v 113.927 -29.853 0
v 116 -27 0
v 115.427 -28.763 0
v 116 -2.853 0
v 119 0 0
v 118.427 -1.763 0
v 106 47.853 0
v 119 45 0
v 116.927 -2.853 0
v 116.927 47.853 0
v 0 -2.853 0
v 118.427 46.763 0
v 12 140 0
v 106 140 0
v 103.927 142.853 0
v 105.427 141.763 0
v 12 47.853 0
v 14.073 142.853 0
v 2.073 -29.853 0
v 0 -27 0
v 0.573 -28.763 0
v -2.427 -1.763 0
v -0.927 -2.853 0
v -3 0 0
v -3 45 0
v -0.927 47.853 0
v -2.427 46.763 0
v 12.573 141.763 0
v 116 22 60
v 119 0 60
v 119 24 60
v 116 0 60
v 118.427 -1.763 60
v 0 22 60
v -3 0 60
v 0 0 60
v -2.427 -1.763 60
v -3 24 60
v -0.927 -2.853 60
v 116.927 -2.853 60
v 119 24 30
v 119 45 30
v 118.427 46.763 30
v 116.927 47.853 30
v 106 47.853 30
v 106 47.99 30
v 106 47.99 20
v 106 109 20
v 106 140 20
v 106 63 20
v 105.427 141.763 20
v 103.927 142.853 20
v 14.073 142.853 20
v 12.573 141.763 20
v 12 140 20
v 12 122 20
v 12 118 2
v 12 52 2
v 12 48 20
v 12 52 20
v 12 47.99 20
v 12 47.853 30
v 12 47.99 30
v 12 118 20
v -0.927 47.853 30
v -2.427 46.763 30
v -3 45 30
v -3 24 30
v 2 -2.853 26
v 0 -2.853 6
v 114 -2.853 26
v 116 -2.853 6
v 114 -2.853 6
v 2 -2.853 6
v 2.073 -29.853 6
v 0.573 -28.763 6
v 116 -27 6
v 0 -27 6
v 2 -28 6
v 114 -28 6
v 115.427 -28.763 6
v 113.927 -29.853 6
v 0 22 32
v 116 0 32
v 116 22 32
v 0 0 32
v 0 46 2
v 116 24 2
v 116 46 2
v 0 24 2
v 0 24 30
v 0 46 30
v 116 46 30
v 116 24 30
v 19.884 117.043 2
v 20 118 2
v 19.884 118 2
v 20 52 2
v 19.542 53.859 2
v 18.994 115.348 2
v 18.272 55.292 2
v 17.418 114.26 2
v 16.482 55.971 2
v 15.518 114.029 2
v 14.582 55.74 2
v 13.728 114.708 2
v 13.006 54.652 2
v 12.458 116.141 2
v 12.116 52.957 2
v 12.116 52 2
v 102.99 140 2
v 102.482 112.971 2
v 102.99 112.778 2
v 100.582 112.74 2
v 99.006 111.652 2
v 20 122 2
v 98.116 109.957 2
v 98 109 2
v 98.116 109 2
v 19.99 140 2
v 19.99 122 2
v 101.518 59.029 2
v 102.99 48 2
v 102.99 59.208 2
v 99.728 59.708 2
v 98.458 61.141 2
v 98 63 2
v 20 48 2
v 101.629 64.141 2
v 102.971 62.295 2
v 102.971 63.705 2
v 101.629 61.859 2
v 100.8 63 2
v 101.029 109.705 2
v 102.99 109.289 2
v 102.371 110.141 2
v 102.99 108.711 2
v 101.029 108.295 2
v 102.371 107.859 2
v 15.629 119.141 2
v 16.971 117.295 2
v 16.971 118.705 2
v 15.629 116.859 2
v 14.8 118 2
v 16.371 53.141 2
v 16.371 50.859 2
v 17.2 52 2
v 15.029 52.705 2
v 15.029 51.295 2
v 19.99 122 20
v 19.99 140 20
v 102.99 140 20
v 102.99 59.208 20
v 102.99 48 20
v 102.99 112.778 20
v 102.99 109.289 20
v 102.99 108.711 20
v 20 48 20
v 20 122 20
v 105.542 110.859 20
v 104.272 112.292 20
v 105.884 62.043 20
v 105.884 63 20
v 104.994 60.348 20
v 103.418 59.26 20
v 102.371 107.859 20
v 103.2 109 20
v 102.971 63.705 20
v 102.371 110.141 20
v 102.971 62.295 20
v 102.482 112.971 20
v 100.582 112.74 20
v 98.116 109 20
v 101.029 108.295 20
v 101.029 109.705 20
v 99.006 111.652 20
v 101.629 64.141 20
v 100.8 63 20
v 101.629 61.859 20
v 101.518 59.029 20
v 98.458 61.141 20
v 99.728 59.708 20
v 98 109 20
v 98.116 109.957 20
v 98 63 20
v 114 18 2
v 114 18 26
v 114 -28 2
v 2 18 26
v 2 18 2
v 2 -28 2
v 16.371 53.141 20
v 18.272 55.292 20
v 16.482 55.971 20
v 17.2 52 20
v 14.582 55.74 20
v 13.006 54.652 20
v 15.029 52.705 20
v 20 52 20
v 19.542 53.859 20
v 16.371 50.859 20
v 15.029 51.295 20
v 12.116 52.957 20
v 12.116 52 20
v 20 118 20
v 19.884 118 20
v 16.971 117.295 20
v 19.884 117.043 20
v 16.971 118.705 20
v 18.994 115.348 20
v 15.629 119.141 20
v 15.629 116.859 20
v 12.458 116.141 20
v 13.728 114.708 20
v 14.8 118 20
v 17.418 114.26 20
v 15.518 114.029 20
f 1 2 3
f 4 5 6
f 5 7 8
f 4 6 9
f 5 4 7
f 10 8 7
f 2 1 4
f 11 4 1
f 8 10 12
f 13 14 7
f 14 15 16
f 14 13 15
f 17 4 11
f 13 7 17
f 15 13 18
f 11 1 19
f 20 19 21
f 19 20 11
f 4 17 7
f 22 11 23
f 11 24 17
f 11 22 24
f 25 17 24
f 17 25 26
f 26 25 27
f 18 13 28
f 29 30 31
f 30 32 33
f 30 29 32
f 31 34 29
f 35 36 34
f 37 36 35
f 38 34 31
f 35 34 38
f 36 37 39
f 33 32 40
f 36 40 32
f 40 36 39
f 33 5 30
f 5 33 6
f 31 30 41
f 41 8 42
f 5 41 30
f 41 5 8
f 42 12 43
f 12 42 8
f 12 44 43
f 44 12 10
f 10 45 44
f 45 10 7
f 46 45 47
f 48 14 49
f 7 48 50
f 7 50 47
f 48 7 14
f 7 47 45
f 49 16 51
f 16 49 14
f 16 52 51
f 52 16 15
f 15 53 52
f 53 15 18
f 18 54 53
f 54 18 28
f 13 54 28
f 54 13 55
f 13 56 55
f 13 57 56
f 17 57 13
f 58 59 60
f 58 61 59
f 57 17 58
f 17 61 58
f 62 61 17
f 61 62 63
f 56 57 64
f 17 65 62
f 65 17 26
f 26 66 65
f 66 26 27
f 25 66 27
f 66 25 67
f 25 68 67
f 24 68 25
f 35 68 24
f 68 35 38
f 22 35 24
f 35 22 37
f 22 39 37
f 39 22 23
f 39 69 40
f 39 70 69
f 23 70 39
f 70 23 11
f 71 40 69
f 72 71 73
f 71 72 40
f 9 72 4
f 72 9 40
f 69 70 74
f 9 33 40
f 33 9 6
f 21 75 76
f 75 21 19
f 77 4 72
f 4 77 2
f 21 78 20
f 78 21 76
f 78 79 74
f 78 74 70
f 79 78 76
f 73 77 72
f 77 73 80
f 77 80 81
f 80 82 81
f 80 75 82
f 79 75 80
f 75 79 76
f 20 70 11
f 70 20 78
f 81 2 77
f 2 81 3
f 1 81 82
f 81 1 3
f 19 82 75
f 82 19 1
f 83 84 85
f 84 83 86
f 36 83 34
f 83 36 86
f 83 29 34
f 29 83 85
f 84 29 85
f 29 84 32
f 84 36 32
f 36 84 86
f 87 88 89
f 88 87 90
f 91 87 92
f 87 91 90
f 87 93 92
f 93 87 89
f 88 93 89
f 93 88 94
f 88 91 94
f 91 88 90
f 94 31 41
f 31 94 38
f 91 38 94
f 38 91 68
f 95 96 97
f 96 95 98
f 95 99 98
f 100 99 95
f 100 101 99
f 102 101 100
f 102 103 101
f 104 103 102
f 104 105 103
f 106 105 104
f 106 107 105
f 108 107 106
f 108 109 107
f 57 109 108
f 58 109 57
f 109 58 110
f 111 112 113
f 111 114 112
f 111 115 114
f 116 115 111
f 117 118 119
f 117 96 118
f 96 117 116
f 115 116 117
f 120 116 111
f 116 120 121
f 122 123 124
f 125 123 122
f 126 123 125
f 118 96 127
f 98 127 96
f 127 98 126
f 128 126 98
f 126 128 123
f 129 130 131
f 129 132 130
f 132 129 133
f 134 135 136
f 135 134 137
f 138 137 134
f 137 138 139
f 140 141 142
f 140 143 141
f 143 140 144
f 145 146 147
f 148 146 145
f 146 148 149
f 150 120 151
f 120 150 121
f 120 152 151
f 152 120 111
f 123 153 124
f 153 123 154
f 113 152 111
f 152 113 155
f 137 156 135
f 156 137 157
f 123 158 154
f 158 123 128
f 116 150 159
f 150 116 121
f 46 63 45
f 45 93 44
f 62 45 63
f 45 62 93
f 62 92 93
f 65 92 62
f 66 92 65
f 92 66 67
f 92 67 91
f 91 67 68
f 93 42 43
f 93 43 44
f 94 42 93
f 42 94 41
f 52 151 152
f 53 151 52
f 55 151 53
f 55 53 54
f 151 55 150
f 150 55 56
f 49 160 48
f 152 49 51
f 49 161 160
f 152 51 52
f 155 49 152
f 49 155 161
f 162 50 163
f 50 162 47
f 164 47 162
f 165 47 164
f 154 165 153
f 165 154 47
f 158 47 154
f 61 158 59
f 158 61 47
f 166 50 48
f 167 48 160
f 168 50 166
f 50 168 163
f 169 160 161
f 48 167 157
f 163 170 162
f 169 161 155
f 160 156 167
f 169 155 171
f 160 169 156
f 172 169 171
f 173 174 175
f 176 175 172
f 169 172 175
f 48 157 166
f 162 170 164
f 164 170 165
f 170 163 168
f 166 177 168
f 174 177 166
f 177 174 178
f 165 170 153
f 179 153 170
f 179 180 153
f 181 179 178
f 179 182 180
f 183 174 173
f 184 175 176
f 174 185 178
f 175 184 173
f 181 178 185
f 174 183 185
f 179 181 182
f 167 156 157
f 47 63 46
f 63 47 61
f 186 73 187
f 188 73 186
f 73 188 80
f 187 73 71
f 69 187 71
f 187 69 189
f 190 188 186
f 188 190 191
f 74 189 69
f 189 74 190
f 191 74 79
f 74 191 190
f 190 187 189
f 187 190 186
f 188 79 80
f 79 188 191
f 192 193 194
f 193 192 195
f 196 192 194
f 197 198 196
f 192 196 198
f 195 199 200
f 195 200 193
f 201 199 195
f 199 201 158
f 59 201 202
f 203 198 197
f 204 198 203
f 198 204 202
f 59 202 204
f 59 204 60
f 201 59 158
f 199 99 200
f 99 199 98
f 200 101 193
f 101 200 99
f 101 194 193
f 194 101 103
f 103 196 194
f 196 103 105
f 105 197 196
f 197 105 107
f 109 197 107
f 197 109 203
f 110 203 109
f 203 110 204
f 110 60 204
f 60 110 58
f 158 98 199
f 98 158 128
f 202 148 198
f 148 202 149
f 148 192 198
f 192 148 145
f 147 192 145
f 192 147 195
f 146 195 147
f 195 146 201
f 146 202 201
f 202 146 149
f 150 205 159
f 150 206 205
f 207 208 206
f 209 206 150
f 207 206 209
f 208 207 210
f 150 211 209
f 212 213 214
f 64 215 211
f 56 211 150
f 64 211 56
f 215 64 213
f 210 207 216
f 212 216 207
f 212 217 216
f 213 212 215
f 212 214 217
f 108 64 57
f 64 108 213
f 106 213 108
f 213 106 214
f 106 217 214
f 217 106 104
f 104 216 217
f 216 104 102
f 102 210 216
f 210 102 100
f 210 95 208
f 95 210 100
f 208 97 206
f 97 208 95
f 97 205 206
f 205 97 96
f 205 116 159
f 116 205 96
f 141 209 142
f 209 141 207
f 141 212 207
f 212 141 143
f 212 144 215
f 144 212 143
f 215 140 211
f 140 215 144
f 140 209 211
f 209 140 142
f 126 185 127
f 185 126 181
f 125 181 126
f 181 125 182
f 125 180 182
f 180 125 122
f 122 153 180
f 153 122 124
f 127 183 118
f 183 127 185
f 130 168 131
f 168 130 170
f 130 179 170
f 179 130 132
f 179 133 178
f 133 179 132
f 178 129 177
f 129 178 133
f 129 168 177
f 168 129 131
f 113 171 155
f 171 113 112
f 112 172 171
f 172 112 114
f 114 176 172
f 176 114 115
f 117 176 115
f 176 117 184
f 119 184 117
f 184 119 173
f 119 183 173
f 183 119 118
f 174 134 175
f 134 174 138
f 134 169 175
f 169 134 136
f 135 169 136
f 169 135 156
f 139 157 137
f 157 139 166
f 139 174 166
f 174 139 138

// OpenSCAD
// file: ../rpi.scad
 // include <./RPi4board-modded.scad>;



// translate([5, 61, 5])
  // rotate([0, 0, 270])
   // board_raspberrypi_4_model_b();


// rpi4([2, 2, 2], [0, 0, 2]);


slop=0.01;
module rpi4(
  rpi_buffer, 
  rpi_padding,
  expose_card=false,
  expose_hdmi=false,
  expose_usb1=false,
  expose_usb2=false,
  expose_ribbon_cable=false,
  expose_gpio_pins=false,
  head_room=4
  )
{
  rpi_screws=[58, 49, 3];
  rpi_size=[88, 58, 13];

  difference() {
    gen_rpi(rpi_screws, rpi_size, rpi_buffer, rpi_padding, expose_card, expose_hdmi, expose_usb1,   expose_usb2, expose_ribbon_cable, expose_gpio_pins, head_room);
  
    // usb 1
    translate([92, 6, 5])
      cube([16, 16, 18]);

    // usb 2
    translate([92, 24, 5])
      cube([16, 16, 18]);

    // ethernet
    translate([92, 42, 5])
      cube([16, 18, 16]);

    // power
    translate([9, -slop, rpi_padding.z + rpi_buffer.z])
      cube([14, rpi_buffer.x + 2*slop, 7]);

    // hdmi
    translate([26.5, -slop, rpi_padding.z + rpi_buffer.z])
      cube([9, rpi_buffer.x + 2*slop, 5]);

    // hdm2
    translate([40, -slop, rpi_padding.z + rpi_buffer.z])
      cube([9, rpi_buffer.x + 2*slop, 5]);

  }
}

module rpi0(
  rpi_buffer, 
  rpi_padding,
  expose_card=false,
  expose_hdmi=false,
  expose_usb1=false,
  expose_usb2=false,
  expose_ribbon_cable=false,
  expose_gpio_pins=false,
  head_room=4
  )
{
  rpi_screws=[58, 23, 3];
  rpi_size=[65, 30, 3];

  gen_rpi(rpi_screws, rpi_size, rpi_buffer, rpi_padding, expose_card, expose_hdmi, expose_usb1, expose_usb2, expose_ribbon_cable, expose_gpio_pins, head_room);
  
  
  
}

module gen_rpi(
  rpi_screws, 
  rpi_size,
  
  rpi_buffer, 
  rpi_padding,
  expose_card=false,
  expose_hdmi=false,
  expose_usb1=false,
  expose_usb2=false,
  expose_ribbon_cable=false,
  expose_gpio_pins=false,
  head_room=4
  )
{
  rpi_envelope=rpi_size + [2, 2, 4];
  sdcard_allowance= expose_card ? 0 : 2;

  mezz_height= max( rpi_padding.z, 3);
  rpi_cutout = rpi_envelope + rpi_padding * 2 - [0, 0, rpi_padding.z];
  rpi_origin = rpi_buffer;
    
  difference()
  {
    union()
    {
      difference()
      {
        cube(rpi_cutout + rpi_buffer + [rpi_buffer.x + sdcard_allowance, rpi_buffer.y, head_room]);
        translate(rpi_origin + [0,0,0])
        cube(rpi_cutout + [0,0,rpi_padding.z + rpi_buffer.z + slop]);
      }
      
      translate(rpi_origin + [rpi_padding.x + 3, rpi_padding.y + 3, 0])
        screws(rpi_screws, mezz_height);
    }
    
    
    
    
    // graphics ribbon
    if (expose_ribbon_cable) {
      translate(rpi_buffer + [-rpi_buffer.x - slop, 7, rpi_buffer.z + rpi_padding.z])
      cube([rpi_buffer.x + rpi_padding.x + slop + slop, 17, rpi_cutout.z]);
    }

    // sd card slot
    if (expose_card) {
      translate(rpi_buffer + [rpi_envelope.x - slop - 1, 11, -rpi_buffer.z - slop])
      cube([rpi_buffer.x + 10 + sdcard_allowance, 15, rpi_cutout.z + rpi_buffer.z*3]);
    }

    if (expose_gpio_pins) {
      translate(rpi_buffer + rpi_padding + [7, -rpi_buffer.y -slop, 0])
      cube([rpi_buffer.x + 12 + 39, rpi_buffer.y + 1 + slop*2, rpi_cutout.z + slop]);
    }

    translate(rpi_buffer + [1, rpi_envelope.y - slop, rpi_buffer.z + rpi_padding.z - 1])
    {
      // usb slot
      if (expose_usb2) {
        translate([5, 0, 0])
        cube([11, rpi_buffer.y + slop*2, 8]);
      }
      // usb slot
      if (expose_usb1) {
        translate([19, 0, 0])
        cube([11, rpi_buffer.y + slop*2, 8]);
      }
      // hdmi
      if (expose_hdmi) {
        translate([44.6, 0, 0])
        cube([16, rpi_buffer.y + slop*2, 8]);
      }
    }
  }
}

module screws(rpi_screws, screw_height)
{
  screw_mount(screw_height, 0);

  translate([rpi_screws.x, 0, 0])
  screw_mount(screw_height, 90);

  translate([rpi_screws.x, rpi_screws.y, 0])
  screw_mount(screw_height, 180);

  translate([0, rpi_screws.y, 0])
  screw_mount(screw_height, 270);
}

module screw_mount(screw_mount_height, rotation)
{
  difference()
  {
    screw_diameter = 1.25;
    screw_mount_dia = 3.5;
    
    translate([screw_mount_dia/2 + 1.75, screw_mount_dia/2 + 1.75, 0])
    rotate(rotation)
    linear_extrude(screw_mount_height)
    hull() {
      mount_size = screw_mount_dia;
      circle(mount_size);
      polygon([[-mount_size, mount_size], [-mount_size,-mount_size], [mount_size,-mount_size]]);
    }
    translate([screw_mount_dia/2 + 1.75, screw_mount_dia/2 +  1.75, slop])
    cylinder(r = screw_diameter, h = screw_mount_height);
  }
}
// main file
use <../rpi.scad>;

expose_card=false;
expose_hdmi=false;
expose_usb1=true;
expose_usb2=false;
expose_ribbon_cable=false;
expose_gpio_pins=false;


module __Customizer_Limit__ () {}

base_width=116;
base_depth=140;
base_height=60;
drive_height=30;
floor_height=2;
corner_radius=3;
slop = 0.01;
post_height=18;

module chomp_stand()
{
  difference()
  {
    base();
    hd_bays();
    cpu_bay();
    cutaways();
    usb_hub_bay();
  }
  screw_posts();
}

module usb_hub_bay()
{

  translate([2, -28, floor_height])

  cube([112,46,24]);

  
}

module cutaways()
{

    translate([  -4, 24, drive_height])
    linear_extrude(base_height-drive_height + floor_height)
    square([123 + slop, 24+slop]);

    translate([  -4, 48 - slop, post_height + floor_height])
    linear_extrude(base_height-post_height + floor_height)
    square([134,220]);


}

module screw_posts()
{
  translate([16, 52, floor_height])
  screw_post();

  translate([16, 118, floor_height])
  rotate(180)
  screw_post();

    translate([102, 63, floor_height])
    rotate(180)
    screw_post();

    translate([102, 109, floor_height])
    screw_post();
  
  translate([98, 65, floor_height])
  linear_extrude(18)
  square([8,42]);

}

module screw_post()
{
    linear_extrude(18)
  difference()
  {
    union()
  {
    circle(4);
    translate([-4, -4])
   square([8,4]);
  }
    circle(1.2);
}
}

module cpu_bay()
{
    translate([-corner_radius - slop + 23, 48, floor_height])
    linear_extrude(60)
    square([83, 92]);

    translate([-corner_radius - slop + 14, 48, floor_height])
    linear_extrude(60)
    square([9 + slop, 74]);
}

module base()
{
    linear_extrude(base_height)
    {
      hull() {
        circle(corner_radius);
        translate([base_width,0]) circle(corner_radius);
        translate([0,45]) circle(corner_radius);
        translate([base_width,45]) circle(corner_radius);
      }
      hull() {
        translate([12,46]) square(corner_radius);
        translate([base_width - 13,46]) square(corner_radius);
        translate([15,base_depth]) circle(corner_radius);
        translate([base_width - 13, base_depth]) circle(corner_radius);
      }
    }
    linear_extrude(floor_height*3)
    {
      hull() {
        translate([0,0]) square(corner_radius);
        translate([base_width - 3,0]) square(corner_radius);
        translate([3,-27]) circle(corner_radius);
        translate([base_width - 3, -27]) circle(corner_radius);
      }
    }
}

module hd_bays()
{
    translate([0, 0, floor_height + 30])
    linear_extrude(60)
    square([116,22]);

    translate([0, 24, floor_height])
    linear_extrude(60)
    square([116,22]);

}

chomp_stand();
